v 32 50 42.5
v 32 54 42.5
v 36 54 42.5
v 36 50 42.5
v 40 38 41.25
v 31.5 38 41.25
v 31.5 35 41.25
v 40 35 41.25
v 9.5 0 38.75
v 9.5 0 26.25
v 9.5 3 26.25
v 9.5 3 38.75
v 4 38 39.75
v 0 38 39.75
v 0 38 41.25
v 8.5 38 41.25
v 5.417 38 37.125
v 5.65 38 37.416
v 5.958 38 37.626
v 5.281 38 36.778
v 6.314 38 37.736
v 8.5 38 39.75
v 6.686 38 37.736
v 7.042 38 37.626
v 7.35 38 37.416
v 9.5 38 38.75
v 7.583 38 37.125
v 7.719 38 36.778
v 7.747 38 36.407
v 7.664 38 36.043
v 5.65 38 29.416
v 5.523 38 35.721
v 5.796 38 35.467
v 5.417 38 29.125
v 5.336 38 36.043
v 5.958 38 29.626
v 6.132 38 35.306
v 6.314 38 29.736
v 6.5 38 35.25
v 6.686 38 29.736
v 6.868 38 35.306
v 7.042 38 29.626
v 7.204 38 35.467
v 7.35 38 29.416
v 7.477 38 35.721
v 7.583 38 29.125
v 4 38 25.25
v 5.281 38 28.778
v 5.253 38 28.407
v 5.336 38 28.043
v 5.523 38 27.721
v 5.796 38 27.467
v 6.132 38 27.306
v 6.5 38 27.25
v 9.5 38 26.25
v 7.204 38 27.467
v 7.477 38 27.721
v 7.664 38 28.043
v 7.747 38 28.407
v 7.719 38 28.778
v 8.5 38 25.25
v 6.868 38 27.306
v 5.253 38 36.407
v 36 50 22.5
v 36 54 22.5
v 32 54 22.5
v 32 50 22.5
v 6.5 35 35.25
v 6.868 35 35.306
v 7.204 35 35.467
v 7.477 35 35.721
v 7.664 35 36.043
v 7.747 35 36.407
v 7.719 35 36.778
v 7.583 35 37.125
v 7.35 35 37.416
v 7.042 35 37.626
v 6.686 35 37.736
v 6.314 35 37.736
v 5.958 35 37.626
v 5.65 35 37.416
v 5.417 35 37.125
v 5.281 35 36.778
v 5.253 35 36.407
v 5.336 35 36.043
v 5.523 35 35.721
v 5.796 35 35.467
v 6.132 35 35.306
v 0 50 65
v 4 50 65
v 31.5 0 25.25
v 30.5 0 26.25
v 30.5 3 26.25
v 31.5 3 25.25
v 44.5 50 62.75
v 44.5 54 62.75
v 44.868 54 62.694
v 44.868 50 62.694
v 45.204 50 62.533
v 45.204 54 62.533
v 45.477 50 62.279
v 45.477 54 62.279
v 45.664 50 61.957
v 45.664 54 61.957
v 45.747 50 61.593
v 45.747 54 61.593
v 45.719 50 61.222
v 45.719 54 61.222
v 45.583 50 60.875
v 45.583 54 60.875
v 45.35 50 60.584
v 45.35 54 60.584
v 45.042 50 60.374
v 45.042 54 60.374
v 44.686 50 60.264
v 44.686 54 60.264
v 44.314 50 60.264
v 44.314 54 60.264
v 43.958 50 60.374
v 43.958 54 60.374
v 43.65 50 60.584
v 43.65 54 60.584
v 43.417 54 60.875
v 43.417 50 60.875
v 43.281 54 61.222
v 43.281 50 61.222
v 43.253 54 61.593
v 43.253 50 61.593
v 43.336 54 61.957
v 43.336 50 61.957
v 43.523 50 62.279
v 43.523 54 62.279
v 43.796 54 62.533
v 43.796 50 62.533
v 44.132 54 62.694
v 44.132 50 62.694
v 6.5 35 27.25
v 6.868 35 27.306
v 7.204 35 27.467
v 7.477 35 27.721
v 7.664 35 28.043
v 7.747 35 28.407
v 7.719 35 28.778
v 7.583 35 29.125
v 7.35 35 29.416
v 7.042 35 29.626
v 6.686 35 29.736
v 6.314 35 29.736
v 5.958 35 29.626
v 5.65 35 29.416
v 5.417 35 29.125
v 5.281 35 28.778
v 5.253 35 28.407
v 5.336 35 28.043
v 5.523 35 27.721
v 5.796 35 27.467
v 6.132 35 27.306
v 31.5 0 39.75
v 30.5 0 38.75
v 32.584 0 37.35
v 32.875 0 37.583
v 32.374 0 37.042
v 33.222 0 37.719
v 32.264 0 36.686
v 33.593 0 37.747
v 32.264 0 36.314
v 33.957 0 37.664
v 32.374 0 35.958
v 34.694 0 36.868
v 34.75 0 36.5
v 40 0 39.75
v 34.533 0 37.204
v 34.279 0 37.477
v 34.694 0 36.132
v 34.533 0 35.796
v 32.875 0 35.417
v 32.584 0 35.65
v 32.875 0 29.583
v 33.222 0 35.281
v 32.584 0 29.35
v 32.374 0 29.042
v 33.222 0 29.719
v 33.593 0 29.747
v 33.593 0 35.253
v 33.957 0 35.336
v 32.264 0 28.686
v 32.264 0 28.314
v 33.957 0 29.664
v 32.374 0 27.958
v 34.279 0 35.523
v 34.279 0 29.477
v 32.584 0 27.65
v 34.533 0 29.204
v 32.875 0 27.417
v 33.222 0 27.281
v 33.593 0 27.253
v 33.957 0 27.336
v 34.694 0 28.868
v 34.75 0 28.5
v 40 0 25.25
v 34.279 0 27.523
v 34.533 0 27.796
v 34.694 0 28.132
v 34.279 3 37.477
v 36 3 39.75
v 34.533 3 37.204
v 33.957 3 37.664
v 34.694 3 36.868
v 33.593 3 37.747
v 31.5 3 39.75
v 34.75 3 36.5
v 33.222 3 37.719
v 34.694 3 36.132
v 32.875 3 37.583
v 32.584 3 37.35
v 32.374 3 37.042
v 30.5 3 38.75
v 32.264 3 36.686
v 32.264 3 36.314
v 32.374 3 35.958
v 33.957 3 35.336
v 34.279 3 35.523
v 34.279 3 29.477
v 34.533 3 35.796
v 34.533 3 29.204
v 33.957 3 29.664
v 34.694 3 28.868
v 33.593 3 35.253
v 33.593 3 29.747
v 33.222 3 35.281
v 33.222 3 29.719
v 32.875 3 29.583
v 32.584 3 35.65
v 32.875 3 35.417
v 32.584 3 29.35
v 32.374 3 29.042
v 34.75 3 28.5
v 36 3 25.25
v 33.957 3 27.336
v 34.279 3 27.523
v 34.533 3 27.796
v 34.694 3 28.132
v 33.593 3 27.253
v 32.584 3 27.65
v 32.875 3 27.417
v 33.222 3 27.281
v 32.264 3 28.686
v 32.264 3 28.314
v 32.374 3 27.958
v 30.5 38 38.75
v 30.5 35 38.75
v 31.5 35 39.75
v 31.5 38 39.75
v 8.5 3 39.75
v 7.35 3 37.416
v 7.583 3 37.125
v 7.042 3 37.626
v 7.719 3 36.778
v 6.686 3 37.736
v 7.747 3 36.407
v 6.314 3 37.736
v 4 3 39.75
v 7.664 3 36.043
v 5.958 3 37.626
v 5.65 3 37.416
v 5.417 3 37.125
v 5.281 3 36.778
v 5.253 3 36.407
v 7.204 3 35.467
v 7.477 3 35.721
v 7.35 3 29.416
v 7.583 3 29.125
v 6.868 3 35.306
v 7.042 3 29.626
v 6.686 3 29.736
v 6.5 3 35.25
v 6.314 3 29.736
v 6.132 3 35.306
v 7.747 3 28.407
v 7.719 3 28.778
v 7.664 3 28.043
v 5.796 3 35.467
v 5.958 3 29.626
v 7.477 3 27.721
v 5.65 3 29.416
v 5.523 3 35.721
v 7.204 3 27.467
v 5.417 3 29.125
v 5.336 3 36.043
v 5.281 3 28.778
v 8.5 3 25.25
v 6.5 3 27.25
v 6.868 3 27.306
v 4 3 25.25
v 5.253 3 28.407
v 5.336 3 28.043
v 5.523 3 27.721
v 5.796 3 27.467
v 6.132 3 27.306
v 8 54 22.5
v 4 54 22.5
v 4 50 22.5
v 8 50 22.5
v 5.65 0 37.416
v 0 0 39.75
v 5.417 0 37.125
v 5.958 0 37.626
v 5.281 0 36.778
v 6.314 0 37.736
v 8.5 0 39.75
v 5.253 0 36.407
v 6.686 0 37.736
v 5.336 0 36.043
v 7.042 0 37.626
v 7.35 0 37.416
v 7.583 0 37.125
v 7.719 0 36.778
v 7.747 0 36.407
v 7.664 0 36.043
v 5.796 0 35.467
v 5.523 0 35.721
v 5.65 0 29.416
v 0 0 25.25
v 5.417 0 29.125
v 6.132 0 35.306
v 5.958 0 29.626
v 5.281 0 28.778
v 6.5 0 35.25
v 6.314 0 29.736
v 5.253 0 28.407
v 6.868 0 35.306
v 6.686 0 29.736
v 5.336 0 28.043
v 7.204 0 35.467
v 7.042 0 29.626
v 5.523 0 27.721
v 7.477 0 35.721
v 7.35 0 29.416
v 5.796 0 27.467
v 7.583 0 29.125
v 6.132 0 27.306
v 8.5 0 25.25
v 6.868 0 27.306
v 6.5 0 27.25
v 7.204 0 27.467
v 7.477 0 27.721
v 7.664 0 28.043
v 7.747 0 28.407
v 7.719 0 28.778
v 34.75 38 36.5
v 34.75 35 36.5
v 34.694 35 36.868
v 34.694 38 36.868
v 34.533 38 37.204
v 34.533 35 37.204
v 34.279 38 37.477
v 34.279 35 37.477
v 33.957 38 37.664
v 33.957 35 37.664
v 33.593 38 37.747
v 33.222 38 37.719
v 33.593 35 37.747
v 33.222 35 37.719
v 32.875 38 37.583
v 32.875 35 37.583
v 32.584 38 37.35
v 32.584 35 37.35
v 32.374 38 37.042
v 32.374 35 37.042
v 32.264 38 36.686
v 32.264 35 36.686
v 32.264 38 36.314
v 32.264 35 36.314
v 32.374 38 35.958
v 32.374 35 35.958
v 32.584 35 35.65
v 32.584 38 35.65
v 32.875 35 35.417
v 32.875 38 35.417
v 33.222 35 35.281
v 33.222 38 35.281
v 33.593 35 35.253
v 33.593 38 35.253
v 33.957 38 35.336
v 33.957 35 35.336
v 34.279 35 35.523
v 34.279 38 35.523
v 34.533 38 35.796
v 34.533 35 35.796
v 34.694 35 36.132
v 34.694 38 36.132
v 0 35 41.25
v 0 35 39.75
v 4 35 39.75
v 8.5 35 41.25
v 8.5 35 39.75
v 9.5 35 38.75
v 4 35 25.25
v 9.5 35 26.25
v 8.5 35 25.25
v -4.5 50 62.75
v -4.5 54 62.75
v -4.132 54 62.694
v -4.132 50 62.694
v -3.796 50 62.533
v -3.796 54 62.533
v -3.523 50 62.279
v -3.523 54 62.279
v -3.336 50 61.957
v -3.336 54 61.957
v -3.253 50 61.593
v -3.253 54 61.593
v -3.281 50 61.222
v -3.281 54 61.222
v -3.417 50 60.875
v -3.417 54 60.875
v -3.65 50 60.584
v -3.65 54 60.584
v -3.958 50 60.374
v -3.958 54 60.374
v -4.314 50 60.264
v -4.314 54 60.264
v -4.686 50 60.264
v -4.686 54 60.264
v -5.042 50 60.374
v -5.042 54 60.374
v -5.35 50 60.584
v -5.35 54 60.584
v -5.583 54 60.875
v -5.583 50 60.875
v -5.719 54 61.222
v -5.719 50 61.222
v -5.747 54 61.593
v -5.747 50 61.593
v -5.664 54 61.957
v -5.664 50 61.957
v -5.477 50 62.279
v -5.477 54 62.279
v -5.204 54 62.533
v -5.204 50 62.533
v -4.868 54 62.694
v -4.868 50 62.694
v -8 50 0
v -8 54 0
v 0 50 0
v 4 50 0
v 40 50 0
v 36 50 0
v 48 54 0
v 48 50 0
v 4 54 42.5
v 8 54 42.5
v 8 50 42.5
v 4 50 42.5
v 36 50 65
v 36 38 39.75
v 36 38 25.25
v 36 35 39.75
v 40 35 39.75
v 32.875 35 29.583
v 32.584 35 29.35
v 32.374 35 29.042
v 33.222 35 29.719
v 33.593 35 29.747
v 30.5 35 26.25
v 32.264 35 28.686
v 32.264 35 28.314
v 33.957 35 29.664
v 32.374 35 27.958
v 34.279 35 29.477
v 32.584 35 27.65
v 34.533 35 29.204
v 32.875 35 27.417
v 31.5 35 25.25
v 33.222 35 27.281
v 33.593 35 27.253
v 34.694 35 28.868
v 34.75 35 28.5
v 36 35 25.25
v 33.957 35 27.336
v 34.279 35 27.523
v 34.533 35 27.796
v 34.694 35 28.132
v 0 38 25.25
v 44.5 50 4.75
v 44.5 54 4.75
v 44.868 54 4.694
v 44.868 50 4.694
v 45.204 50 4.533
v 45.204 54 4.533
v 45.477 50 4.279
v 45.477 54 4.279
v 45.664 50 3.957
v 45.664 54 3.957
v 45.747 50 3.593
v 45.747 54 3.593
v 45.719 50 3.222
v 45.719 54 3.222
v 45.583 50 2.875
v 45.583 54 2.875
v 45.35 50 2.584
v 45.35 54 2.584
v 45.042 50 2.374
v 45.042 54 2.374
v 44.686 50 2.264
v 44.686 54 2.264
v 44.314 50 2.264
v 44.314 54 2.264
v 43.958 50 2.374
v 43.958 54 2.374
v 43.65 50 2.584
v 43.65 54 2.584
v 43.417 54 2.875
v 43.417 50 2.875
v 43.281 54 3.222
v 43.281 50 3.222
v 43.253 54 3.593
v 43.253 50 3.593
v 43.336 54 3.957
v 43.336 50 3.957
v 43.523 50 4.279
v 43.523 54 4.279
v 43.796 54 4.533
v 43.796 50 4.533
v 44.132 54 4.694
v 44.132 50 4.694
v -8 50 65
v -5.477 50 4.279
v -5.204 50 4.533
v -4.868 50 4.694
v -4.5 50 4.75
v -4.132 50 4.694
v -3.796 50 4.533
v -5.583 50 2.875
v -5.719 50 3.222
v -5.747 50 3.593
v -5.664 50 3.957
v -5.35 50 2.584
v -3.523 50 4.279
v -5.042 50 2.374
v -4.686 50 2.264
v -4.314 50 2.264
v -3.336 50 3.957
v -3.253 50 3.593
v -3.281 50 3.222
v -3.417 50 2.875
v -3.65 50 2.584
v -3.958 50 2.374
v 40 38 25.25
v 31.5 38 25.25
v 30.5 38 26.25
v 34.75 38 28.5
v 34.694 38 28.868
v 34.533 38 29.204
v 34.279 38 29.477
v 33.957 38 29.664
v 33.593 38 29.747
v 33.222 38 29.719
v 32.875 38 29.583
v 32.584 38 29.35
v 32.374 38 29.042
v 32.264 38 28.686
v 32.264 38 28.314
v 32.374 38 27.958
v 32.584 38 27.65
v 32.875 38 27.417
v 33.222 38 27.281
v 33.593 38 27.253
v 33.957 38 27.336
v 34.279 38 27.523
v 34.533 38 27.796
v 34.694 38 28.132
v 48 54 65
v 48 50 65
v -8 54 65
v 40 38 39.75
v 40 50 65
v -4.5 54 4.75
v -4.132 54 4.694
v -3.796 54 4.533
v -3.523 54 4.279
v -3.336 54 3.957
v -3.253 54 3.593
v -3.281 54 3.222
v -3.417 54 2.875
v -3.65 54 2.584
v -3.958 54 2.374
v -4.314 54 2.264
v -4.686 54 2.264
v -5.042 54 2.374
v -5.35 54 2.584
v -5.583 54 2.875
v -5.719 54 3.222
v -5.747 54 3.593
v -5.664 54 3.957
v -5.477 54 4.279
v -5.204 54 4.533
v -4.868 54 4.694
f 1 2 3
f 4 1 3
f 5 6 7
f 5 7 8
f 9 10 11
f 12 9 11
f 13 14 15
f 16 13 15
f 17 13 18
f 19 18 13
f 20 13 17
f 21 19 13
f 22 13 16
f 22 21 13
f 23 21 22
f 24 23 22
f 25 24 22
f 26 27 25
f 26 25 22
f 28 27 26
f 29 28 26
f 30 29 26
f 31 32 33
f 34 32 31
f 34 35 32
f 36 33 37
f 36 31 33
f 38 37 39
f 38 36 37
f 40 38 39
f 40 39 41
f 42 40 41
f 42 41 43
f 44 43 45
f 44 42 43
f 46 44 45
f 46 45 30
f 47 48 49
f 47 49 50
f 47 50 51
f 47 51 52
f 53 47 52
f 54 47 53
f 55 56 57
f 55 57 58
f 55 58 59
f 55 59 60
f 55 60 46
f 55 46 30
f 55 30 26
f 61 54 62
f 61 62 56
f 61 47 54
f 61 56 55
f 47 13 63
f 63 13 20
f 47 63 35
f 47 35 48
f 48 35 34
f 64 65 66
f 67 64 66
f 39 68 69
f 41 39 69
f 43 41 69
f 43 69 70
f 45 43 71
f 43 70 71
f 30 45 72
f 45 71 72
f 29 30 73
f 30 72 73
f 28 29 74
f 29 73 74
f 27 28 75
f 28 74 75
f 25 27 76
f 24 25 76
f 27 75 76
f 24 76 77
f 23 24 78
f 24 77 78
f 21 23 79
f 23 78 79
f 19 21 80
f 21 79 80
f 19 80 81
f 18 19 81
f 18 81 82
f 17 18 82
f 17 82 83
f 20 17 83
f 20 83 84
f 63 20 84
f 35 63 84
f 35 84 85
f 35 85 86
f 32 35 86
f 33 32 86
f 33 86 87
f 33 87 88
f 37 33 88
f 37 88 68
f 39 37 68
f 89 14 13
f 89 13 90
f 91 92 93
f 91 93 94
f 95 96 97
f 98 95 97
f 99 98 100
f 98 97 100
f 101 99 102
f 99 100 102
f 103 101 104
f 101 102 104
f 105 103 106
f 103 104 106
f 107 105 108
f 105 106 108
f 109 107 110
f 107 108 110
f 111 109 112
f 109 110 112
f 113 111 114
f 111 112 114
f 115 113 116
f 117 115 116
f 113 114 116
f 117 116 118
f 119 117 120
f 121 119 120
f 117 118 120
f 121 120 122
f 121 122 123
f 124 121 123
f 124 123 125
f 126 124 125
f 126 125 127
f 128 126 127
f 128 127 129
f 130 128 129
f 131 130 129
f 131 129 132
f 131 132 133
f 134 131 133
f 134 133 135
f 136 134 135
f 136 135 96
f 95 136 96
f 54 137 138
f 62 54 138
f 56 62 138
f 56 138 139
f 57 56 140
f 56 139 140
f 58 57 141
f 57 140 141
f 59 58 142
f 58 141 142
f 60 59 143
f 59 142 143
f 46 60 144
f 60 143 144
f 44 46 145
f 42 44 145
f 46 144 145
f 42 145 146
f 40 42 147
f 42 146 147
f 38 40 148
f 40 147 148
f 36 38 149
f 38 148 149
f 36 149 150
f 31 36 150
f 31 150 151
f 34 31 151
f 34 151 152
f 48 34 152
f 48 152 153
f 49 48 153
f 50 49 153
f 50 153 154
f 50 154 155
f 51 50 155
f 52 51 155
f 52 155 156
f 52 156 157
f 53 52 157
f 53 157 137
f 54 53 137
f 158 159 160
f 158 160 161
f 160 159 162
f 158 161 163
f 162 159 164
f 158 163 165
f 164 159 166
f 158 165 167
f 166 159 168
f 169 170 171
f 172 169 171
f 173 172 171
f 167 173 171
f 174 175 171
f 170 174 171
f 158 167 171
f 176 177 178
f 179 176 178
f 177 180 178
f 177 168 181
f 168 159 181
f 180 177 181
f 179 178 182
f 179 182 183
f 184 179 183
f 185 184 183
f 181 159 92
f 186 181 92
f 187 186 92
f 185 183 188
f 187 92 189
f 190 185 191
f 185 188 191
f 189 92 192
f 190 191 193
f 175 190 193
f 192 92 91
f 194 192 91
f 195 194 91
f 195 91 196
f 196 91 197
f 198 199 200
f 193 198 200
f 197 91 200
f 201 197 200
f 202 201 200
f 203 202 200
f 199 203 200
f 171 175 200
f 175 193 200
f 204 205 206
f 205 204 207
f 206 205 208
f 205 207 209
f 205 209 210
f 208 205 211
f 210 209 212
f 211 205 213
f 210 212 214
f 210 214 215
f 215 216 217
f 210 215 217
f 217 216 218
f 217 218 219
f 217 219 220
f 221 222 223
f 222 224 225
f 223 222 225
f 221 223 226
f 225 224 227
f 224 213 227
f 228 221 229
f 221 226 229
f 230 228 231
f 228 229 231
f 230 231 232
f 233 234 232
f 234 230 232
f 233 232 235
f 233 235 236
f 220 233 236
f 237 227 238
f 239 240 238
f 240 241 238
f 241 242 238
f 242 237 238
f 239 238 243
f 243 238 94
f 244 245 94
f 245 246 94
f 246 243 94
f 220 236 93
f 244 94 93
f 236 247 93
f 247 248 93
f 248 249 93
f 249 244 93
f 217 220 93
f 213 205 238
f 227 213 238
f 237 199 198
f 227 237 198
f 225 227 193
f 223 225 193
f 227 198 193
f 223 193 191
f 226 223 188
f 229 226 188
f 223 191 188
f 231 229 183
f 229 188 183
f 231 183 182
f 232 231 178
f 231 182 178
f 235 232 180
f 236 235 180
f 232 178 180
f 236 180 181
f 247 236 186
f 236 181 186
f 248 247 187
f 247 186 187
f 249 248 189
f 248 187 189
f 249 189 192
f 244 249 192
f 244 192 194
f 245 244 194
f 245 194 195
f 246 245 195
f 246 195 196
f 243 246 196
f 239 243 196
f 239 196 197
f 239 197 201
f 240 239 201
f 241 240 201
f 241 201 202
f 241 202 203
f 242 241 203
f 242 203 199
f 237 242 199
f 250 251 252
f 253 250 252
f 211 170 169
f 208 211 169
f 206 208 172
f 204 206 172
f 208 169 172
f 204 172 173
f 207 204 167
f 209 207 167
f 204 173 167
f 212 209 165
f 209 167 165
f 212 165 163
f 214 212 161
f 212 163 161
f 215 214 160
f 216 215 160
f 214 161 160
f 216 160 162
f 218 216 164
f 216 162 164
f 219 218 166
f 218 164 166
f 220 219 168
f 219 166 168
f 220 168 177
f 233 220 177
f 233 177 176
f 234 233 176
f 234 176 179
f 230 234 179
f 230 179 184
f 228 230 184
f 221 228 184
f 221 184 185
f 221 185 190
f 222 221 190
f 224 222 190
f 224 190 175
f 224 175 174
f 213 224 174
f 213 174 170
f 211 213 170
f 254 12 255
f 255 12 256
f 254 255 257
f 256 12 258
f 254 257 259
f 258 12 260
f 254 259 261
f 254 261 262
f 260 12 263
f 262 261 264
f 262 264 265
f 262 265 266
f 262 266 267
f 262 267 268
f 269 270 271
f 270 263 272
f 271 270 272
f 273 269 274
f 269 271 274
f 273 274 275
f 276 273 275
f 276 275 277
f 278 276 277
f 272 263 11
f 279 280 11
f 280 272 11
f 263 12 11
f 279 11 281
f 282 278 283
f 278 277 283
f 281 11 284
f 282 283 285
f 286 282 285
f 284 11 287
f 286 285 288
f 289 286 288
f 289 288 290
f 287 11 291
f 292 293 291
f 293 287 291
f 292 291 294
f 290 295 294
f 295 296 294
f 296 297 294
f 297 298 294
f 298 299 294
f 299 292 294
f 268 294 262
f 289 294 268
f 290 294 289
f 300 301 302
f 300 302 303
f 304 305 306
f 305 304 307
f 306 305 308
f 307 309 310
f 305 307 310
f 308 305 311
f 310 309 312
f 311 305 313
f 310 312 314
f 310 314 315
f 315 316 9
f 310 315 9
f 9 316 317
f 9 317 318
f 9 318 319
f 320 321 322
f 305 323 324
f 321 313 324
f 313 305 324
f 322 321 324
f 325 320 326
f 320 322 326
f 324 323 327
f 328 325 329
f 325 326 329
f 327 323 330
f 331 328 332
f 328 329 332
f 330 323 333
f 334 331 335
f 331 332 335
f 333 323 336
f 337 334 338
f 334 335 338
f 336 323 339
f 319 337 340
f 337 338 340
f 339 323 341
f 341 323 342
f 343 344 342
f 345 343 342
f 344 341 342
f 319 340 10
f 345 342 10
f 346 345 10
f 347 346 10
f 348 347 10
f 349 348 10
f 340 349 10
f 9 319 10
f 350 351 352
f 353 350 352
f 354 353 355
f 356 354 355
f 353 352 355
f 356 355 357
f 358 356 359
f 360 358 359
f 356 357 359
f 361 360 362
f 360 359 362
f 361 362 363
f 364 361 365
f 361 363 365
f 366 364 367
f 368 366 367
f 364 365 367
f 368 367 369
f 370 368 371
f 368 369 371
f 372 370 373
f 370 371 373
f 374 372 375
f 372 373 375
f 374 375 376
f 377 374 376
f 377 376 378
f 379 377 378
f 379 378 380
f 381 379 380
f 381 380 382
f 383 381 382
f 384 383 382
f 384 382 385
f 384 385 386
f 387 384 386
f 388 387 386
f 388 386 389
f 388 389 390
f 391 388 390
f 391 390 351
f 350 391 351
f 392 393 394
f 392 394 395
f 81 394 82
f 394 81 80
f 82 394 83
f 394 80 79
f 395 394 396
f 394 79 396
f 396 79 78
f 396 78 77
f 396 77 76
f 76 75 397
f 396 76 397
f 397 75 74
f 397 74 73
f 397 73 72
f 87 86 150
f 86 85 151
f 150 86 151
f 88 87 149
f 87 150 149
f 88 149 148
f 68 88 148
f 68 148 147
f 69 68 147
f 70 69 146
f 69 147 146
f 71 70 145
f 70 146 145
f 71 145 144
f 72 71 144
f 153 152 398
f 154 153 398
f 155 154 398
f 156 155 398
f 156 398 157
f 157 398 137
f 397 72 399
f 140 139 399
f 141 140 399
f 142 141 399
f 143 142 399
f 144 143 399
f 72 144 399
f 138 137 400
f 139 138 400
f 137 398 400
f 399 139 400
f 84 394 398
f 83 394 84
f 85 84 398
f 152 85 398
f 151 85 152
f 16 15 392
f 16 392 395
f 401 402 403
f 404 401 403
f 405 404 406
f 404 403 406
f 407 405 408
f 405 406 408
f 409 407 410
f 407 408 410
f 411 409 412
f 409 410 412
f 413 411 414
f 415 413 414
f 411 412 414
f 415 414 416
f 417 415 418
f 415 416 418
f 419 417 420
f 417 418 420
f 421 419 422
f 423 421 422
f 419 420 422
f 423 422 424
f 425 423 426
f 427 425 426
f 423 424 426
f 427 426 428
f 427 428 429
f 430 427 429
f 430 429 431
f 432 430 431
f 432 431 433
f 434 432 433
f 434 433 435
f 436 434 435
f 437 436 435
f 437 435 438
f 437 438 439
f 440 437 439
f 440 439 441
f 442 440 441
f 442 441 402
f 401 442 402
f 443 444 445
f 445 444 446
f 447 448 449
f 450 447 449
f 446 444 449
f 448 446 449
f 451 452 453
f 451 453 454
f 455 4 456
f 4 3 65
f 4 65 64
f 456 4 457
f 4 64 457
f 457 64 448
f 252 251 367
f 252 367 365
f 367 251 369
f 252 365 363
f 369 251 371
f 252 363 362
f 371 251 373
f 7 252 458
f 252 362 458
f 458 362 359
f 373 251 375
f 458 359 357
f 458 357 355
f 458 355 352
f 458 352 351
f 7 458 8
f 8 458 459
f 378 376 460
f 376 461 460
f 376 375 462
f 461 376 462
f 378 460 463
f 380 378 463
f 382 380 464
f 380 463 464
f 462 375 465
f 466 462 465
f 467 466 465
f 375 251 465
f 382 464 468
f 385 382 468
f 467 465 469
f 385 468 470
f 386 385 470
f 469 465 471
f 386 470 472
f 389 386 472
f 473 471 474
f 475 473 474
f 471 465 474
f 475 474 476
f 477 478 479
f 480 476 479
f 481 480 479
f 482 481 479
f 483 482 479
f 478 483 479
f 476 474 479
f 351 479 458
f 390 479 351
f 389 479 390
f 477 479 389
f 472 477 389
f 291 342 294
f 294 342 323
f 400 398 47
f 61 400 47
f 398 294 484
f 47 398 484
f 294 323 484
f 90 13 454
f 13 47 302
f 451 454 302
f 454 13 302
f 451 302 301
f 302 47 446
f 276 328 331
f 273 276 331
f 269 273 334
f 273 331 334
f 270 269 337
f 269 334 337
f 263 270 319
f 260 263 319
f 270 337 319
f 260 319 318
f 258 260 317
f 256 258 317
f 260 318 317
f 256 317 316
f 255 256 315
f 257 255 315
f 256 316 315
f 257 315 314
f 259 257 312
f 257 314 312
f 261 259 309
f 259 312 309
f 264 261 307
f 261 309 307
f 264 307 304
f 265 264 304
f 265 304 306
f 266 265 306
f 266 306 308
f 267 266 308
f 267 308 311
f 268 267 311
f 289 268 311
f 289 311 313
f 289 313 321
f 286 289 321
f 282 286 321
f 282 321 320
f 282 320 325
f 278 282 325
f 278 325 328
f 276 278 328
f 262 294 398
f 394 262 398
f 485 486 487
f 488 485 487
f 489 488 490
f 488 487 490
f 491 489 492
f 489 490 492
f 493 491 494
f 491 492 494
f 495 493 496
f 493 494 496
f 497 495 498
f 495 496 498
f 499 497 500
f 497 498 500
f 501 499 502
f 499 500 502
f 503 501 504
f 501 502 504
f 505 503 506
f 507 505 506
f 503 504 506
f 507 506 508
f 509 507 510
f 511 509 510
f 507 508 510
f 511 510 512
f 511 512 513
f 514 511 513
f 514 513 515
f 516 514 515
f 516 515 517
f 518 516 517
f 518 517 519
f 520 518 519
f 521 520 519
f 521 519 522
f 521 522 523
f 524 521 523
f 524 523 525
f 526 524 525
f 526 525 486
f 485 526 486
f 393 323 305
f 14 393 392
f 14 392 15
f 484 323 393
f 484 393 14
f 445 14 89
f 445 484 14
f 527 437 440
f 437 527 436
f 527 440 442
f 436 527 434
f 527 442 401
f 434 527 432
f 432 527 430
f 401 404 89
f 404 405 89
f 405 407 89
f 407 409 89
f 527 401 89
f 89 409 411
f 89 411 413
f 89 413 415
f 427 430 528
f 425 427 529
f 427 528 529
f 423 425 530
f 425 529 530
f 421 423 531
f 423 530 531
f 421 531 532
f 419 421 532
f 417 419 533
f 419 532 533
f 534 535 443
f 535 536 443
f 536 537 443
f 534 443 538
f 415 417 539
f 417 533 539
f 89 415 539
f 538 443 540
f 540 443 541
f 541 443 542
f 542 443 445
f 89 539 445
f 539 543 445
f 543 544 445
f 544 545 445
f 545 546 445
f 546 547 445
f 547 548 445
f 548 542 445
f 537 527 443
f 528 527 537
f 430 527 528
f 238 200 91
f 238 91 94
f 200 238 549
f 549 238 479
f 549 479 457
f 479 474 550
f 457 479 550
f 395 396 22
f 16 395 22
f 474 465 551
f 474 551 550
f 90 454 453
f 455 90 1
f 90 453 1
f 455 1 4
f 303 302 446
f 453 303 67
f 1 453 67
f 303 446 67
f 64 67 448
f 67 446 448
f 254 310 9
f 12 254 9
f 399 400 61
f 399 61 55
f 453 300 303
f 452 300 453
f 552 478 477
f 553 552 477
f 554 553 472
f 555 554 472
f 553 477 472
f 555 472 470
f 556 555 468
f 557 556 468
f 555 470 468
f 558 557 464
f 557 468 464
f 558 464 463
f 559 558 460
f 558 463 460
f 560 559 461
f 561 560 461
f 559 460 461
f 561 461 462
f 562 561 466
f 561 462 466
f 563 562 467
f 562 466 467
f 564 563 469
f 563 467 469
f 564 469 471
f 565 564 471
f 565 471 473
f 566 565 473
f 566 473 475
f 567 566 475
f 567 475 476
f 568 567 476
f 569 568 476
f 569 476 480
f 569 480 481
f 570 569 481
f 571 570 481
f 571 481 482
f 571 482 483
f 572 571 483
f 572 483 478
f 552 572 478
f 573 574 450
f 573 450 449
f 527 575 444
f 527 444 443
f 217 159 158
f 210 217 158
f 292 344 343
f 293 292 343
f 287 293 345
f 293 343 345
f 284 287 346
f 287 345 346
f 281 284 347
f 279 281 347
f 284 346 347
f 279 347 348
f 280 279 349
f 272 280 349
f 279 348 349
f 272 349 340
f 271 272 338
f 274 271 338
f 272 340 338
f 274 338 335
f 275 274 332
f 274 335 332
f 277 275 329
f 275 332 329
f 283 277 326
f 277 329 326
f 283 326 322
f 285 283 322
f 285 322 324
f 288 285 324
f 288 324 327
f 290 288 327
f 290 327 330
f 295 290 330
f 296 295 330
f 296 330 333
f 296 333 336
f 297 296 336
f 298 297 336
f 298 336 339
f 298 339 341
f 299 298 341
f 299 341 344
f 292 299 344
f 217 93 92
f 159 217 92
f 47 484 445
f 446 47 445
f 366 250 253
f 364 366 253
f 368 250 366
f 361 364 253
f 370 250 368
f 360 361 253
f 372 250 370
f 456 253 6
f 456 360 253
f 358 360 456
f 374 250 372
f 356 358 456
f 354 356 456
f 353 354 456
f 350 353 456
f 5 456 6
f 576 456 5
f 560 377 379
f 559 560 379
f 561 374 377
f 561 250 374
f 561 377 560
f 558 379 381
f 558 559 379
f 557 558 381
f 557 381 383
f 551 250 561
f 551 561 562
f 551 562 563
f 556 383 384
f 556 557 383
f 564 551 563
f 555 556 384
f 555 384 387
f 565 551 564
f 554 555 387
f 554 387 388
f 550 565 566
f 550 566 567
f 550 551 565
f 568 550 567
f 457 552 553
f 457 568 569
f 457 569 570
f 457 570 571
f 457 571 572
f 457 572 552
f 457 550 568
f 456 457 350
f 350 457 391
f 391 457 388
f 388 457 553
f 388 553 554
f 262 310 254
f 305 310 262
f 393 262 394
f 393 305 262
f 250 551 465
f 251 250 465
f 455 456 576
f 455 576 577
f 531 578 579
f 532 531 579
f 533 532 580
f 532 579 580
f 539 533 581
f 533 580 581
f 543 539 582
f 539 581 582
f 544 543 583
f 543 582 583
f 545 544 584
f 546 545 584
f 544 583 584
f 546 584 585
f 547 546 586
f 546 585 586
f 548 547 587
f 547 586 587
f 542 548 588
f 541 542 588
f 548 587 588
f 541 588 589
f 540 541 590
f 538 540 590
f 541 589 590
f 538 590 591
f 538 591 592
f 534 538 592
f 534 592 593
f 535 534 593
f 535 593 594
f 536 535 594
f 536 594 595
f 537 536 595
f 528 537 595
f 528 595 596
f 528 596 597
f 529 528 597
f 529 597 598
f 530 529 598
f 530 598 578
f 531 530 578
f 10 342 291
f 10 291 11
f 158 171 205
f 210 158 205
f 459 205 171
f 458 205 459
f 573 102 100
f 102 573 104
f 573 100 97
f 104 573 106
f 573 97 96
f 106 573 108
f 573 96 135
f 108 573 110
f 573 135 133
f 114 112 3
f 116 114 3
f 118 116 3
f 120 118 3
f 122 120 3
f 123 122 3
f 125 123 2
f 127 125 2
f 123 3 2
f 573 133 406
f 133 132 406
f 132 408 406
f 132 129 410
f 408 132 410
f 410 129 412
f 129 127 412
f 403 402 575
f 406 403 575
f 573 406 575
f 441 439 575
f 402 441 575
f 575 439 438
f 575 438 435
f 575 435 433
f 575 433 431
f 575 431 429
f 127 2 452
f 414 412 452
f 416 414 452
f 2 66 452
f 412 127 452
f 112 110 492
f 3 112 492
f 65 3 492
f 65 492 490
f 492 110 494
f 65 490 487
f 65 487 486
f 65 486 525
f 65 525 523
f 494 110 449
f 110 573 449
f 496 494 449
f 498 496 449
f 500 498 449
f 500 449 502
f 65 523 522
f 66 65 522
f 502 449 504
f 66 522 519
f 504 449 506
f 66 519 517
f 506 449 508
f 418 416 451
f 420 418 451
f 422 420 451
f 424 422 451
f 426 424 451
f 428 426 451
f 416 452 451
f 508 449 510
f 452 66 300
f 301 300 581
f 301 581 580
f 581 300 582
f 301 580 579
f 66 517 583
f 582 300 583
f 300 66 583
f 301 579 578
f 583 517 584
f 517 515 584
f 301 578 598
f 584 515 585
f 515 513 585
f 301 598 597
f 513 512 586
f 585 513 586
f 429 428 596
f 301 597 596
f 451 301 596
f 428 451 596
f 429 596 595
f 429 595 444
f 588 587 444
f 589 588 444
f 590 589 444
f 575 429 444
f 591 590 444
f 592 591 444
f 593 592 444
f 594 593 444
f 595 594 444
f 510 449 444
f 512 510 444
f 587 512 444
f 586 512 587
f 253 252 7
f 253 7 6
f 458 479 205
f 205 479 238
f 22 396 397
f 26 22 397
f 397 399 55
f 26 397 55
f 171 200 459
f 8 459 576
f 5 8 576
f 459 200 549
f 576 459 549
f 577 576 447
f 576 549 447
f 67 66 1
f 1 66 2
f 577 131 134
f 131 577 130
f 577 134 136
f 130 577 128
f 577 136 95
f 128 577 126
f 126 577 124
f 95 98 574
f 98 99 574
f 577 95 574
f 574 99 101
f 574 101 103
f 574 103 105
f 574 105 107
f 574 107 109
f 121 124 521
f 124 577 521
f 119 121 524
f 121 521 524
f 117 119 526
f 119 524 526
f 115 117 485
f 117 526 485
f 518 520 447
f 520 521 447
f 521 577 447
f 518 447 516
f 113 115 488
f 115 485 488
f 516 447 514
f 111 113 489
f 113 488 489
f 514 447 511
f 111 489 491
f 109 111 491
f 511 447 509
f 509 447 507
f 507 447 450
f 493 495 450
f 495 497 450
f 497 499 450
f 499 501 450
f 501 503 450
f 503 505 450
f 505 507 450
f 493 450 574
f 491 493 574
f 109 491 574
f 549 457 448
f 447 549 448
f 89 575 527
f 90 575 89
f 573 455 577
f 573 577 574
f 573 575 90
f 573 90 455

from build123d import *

# Parameters (mm, degrees)
EXTRUDE_1_DEPTH      = 65
CUT_EXTRUDE_2_REACH  = 99.185
SKETCH_2_R           = 1.25
CUT_EXTRUDE_4_REACH  = 99.185
SKETCH_10_R          = 1.25
CUT_EXTRUDE_8_DEPTH  = 98.185389848
CUT_EXTRUDE_9_REACH  = 99.185
CUT_EXTRUDE_10_REACH = 99.185
SKETCH_25_W          = 8.5
SKETCH_25_H          = 3
EXTRUDE_2_DEPTH      = 1.5
SKETCH_26_W          = 8.5
SKETCH_26_H          = 3
EXTRUDE_3_DEPTH      = 1.5
CUT_EXTRUDE_11_REACH = 99.185


with BuildPart() as part:
    # 草图1 → 凸台-拉伸1 (new body)
    with BuildSketch(Plane.XY):
        Polygon((9.5, 3), (4, 3), (4, 35), (9.5, 35), (9.5, 38), (4, 38), (4, 50), (36, 50), (36, 38), (30.5, 38), (30.5, 35), (36, 35), (36, 3), (30.5, 3), (30.5, 0), (40, 0), (40, 50), (48, 50), (48, 54), (-8, 54), (-8, 50), (0, 50), (0, 0), (9.5, 0), align=None)
    extrude(amount=EXTRUDE_1_DEPTH)

    # 草图2 → 切除-拉伸2 (cut, up to next)
    with BuildSketch(Plane(origin=(0, 54, 0), x_dir=(1, 0, 0), z_dir=(0, 1, 0)), mode=Mode.PRIVATE) as cut_extrude_2_sk1:
        with Locations(Location((-4.5, -61.5, 0), (0, 0, 270))):
            Circle(SKETCH_2_R)
    cut_extrude_2_tool1 = extrude(cut_extrude_2_sk1.sketch, amount=-CUT_EXTRUDE_2_REACH, mode=Mode.PRIVATE) & part.part
    # 草图2 → 切除-拉伸2 (cut, up to next)
    with BuildSketch(Plane(origin=(0, 54, 0), x_dir=(1, 0, 0), z_dir=(0, 1, 0)), mode=Mode.PRIVATE) as cut_extrude_2_sk2:
        with Locations(Location((44.5, -61.5, 0), (0, 0, 270))):
            Circle(SKETCH_2_R)
    cut_extrude_2_tool2 = extrude(cut_extrude_2_sk2.sketch, amount=-CUT_EXTRUDE_2_REACH, mode=Mode.PRIVATE) & part.part
    # 草图2 → 切除-拉伸2 (cut, up to next)
    with BuildSketch(Plane(origin=(0, 54, 0), x_dir=(1, 0, 0), z_dir=(0, 1, 0)), mode=Mode.PRIVATE) as cut_extrude_2_sk3:
        with Locations(Location((44.5, -3.5, 0), (0, 0, 270))):
            Circle(SKETCH_2_R)
    cut_extrude_2_tool3 = extrude(cut_extrude_2_sk3.sketch, amount=-CUT_EXTRUDE_2_REACH, mode=Mode.PRIVATE) & part.part
    # 草图2 → 切除-拉伸2 (cut, up to next)
    with BuildSketch(Plane(origin=(0, 54, 0), x_dir=(1, 0, 0), z_dir=(0, 1, 0)), mode=Mode.PRIVATE) as cut_extrude_2_sk4:
        with Locations(Location((-4.5, -3.5, 0), (0, 0, 270))):
            Circle(SKETCH_2_R)
    cut_extrude_2_tool4 = extrude(cut_extrude_2_sk4.sketch, amount=-CUT_EXTRUDE_2_REACH, mode=Mode.PRIVATE) & part.part
    add(cut_extrude_2_tool1.solids().sort_by_distance((-4.5, 54, 61.5))[0], mode=Mode.SUBTRACT)
    add(cut_extrude_2_tool2.solids().sort_by_distance((44.5, 54, 61.5))[0], mode=Mode.SUBTRACT)
    add(cut_extrude_2_tool3.solids().sort_by_distance((44.5, 54, 3.5))[0], mode=Mode.SUBTRACT)
    add(cut_extrude_2_tool4.solids().sort_by_distance((-4.5, 54, 3.5))[0], mode=Mode.SUBTRACT)

    # 切除-拉伸4: up to this face of the body (flat: up to its plane)
    cut_extrude_4_end = Plane(part.part.faces().sort_by_distance((6.75, 38, 32.5))[0])
    # 草图10 → 切除-拉伸4 (cut, up to the picked face)
    with BuildSketch(Plane.XZ, mode=Mode.PRIVATE) as cut_extrude_4_sk1:
        with Locations((33.5, 36.5)):
            Circle(SKETCH_10_R)
    cut_extrude_4_tool1 = split(extrude(cut_extrude_4_sk1.sketch, amount=-CUT_EXTRUDE_4_REACH, mode=Mode.PRIVATE), bisect_by=cut_extrude_4_end, keep=Keep.BOTH, mode=Mode.PRIVATE)
    # 草图10 → 切除-拉伸4 (cut, up to the picked face)
    with BuildSketch(Plane.XZ, mode=Mode.PRIVATE) as cut_extrude_4_sk2:
        with Locations((33.5, 28.5)):
            Circle(SKETCH_10_R)
    cut_extrude_4_tool2 = split(extrude(cut_extrude_4_sk2.sketch, amount=-CUT_EXTRUDE_4_REACH, mode=Mode.PRIVATE), bisect_by=cut_extrude_4_end, keep=Keep.BOTH, mode=Mode.PRIVATE)
    # 草图10 → 切除-拉伸4 (cut, up to the picked face)
    with BuildSketch(Plane.XZ, mode=Mode.PRIVATE) as cut_extrude_4_sk3:
        with Locations(Location((6.5, 28.5, 0), (0, 0, 270))):
            Circle(SKETCH_10_R)
    cut_extrude_4_tool3 = split(extrude(cut_extrude_4_sk3.sketch, amount=-CUT_EXTRUDE_4_REACH, mode=Mode.PRIVATE), bisect_by=cut_extrude_4_end, keep=Keep.BOTH, mode=Mode.PRIVATE)
    # 草图10 → 切除-拉伸4 (cut, up to the picked face)
    with BuildSketch(Plane.XZ, mode=Mode.PRIVATE) as cut_extrude_4_sk4:
        with Locations(Location((6.5, 36.5, 0), (0, 0, 270))):
            Circle(SKETCH_10_R)
    cut_extrude_4_tool4 = split(extrude(cut_extrude_4_sk4.sketch, amount=-CUT_EXTRUDE_4_REACH, mode=Mode.PRIVATE), bisect_by=cut_extrude_4_end, keep=Keep.BOTH, mode=Mode.PRIVATE)
    add(cut_extrude_4_tool1.solids().sort_by(Axis((33.5, 0, 36.5), (0, 1, 0)))[0], mode=Mode.SUBTRACT)
    add(cut_extrude_4_tool2.solids().sort_by(Axis((33.5, 0, 28.5), (0, 1, 0)))[0], mode=Mode.SUBTRACT)
    add(cut_extrude_4_tool3.solids().sort_by(Axis((6.5, 0, 28.5), (0, 1, 0)))[0], mode=Mode.SUBTRACT)
    add(cut_extrude_4_tool4.solids().sort_by(Axis((6.5, 0, 36.5), (0, 1, 0)))[0], mode=Mode.SUBTRACT)

    # 草图20 → 切除-拉伸8 (cut, through all)
    with BuildSketch(Plane.ZY):
        Polygon((0, 50), (0, 0), (25.25, 0), (25.25, 38), align=None)
        Polygon((65, 50), (65, 0), (39.75, 0), (39.75, 38), align=None)
    extrude(amount=-CUT_EXTRUDE_8_DEPTH, mode=Mode.SUBTRACT)

    # 切除-拉伸9: up to this face of the body (flat: up to its plane)
    cut_extrude_9_end = Plane(part.part.faces().sort_by_distance((33.214903751, 38, 32.5))[0])
    # 草图21 → 切除-拉伸9 (cut, up to the picked face)
    with BuildSketch(Plane.XZ, mode=Mode.PRIVATE) as cut_extrude_9_sk1:
        Polygon((30.5, 38.75), (31.5, 39.75), (30.5, 39.75), align=None)
    cut_extrude_9_tool1 = split(extrude(cut_extrude_9_sk1.sketch, amount=-CUT_EXTRUDE_9_REACH, mode=Mode.PRIVATE), bisect_by=cut_extrude_9_end, keep=Keep.BOTH, mode=Mode.PRIVATE)
    # 草图21 → 切除-拉伸9 (cut, up to the picked face)
    with BuildSketch(Plane.XZ, mode=Mode.PRIVATE) as cut_extrude_9_sk2:
        Polygon((30.5, 26.25), (31.5, 25.25), (30.5, 25.25), align=None)
    cut_extrude_9_tool2 = split(extrude(cut_extrude_9_sk2.sketch, amount=-CUT_EXTRUDE_9_REACH, mode=Mode.PRIVATE), bisect_by=cut_extrude_9_end, keep=Keep.BOTH, mode=Mode.PRIVATE)
    add(cut_extrude_9_tool1.solids().sort_by(Axis((30.833333, 0, 39.416667), (0, 1, 0)))[0], mode=Mode.SUBTRACT)
    add(cut_extrude_9_tool2.solids().sort_by(Axis((30.833333, 0, 25.583333), (0, 1, 0)))[0], mode=Mode.SUBTRACT)

    # 切除-拉伸10: up to this face of the body (flat: up to its plane)
    cut_extrude_10_end = Plane(part.part.faces().sort_by_distance((6.785096249, 38, 32.5))[0])
    # 草图22 → 切除-拉伸10 (cut, up to the picked face)
    with BuildSketch(Plane(origin=(0, 0, 0), x_dir=(-1, 0, 0), z_dir=(0, -1, 0)), mode=Mode.PRIVATE) as cut_extrude_10_sk1:
        Polygon((-8.5, -39.75), (-9.5, -38.75), (-9.5, -39.75), align=None)
    cut_extrude_10_tool1 = split(extrude(cut_extrude_10_sk1.sketch, amount=-CUT_EXTRUDE_10_REACH, mode=Mode.PRIVATE), bisect_by=cut_extrude_10_end, keep=Keep.BOTH, mode=Mode.PRIVATE)
    # 草图22 → 切除-拉伸10 (cut, up to the picked face)
    with BuildSketch(Plane(origin=(0, 0, 0), x_dir=(-1, 0, 0), z_dir=(0, -1, 0)), mode=Mode.PRIVATE) as cut_extrude_10_sk2:
        Polygon((-9.5, -25.25), (-8.5, -25.25), (-9.5, -26.25), align=None)
    cut_extrude_10_tool2 = split(extrude(cut_extrude_10_sk2.sketch, amount=-CUT_EXTRUDE_10_REACH, mode=Mode.PRIVATE), bisect_by=cut_extrude_10_end, keep=Keep.BOTH, mode=Mode.PRIVATE)
    add(cut_extrude_10_tool1.solids().sort_by(Axis((9.166667, 0, 39.416667), (0, 1, 0)))[0], mode=Mode.SUBTRACT)
    add(cut_extrude_10_tool2.solids().sort_by(Axis((9.166667, 0, 25.583333), (0, 1, 0)))[0], mode=Mode.SUBTRACT)

    # 草图25 → 凸台-拉伸2 (add)
    with BuildSketch(Plane.XY.offset(39.75)):
        with Locations((4.25, 36.5)):
            Rectangle(SKETCH_25_W, SKETCH_25_H)
    extrude(amount=EXTRUDE_2_DEPTH)

    # 草图26 → 凸台-拉伸3 (add)
    with BuildSketch(Plane.XY.offset(39.75)):
        with Locations((35.75, 36.5)):
            Rectangle(SKETCH_26_W, SKETCH_26_H)
    extrude(amount=EXTRUDE_3_DEPTH)

    # 草图27 → 切除-拉伸11 (cut, up to next)
    with BuildSketch(Plane(origin=(0, 54, 0), x_dir=(1, 0, 0), z_dir=(0, 1, 0)), mode=Mode.PRIVATE) as cut_extrude_11_sk1:
        Polygon((4, -32.5), (4, -22.5), (8, -22.5), (8, -42.5), (4, -42.5), align=None)
    cut_extrude_11_tool1 = extrude(cut_extrude_11_sk1.sketch, amount=-CUT_EXTRUDE_11_REACH, mode=Mode.PRIVATE) & part.part
    # 草图27 → 切除-拉伸11 (cut, up to next)
    with BuildSketch(Plane(origin=(0, 54, 0), x_dir=(1, 0, 0), z_dir=(0, 1, 0)), mode=Mode.PRIVATE) as cut_extrude_11_sk2:
        Polygon((36, -32.5), (36, -22.5), (32, -22.5), (32, -42.5), (36, -42.5), align=None)
    cut_extrude_11_tool2 = extrude(cut_extrude_11_sk2.sketch, amount=-CUT_EXTRUDE_11_REACH, mode=Mode.PRIVATE) & part.part
    add(cut_extrude_11_tool1.solids().sort_by_distance((6, 54, 32.5))[0], mode=Mode.SUBTRACT)
    add(cut_extrude_11_tool2.solids().sort_by_distance((34, 54, 32.5))[0], mode=Mode.SUBTRACT)


solid = part.part
